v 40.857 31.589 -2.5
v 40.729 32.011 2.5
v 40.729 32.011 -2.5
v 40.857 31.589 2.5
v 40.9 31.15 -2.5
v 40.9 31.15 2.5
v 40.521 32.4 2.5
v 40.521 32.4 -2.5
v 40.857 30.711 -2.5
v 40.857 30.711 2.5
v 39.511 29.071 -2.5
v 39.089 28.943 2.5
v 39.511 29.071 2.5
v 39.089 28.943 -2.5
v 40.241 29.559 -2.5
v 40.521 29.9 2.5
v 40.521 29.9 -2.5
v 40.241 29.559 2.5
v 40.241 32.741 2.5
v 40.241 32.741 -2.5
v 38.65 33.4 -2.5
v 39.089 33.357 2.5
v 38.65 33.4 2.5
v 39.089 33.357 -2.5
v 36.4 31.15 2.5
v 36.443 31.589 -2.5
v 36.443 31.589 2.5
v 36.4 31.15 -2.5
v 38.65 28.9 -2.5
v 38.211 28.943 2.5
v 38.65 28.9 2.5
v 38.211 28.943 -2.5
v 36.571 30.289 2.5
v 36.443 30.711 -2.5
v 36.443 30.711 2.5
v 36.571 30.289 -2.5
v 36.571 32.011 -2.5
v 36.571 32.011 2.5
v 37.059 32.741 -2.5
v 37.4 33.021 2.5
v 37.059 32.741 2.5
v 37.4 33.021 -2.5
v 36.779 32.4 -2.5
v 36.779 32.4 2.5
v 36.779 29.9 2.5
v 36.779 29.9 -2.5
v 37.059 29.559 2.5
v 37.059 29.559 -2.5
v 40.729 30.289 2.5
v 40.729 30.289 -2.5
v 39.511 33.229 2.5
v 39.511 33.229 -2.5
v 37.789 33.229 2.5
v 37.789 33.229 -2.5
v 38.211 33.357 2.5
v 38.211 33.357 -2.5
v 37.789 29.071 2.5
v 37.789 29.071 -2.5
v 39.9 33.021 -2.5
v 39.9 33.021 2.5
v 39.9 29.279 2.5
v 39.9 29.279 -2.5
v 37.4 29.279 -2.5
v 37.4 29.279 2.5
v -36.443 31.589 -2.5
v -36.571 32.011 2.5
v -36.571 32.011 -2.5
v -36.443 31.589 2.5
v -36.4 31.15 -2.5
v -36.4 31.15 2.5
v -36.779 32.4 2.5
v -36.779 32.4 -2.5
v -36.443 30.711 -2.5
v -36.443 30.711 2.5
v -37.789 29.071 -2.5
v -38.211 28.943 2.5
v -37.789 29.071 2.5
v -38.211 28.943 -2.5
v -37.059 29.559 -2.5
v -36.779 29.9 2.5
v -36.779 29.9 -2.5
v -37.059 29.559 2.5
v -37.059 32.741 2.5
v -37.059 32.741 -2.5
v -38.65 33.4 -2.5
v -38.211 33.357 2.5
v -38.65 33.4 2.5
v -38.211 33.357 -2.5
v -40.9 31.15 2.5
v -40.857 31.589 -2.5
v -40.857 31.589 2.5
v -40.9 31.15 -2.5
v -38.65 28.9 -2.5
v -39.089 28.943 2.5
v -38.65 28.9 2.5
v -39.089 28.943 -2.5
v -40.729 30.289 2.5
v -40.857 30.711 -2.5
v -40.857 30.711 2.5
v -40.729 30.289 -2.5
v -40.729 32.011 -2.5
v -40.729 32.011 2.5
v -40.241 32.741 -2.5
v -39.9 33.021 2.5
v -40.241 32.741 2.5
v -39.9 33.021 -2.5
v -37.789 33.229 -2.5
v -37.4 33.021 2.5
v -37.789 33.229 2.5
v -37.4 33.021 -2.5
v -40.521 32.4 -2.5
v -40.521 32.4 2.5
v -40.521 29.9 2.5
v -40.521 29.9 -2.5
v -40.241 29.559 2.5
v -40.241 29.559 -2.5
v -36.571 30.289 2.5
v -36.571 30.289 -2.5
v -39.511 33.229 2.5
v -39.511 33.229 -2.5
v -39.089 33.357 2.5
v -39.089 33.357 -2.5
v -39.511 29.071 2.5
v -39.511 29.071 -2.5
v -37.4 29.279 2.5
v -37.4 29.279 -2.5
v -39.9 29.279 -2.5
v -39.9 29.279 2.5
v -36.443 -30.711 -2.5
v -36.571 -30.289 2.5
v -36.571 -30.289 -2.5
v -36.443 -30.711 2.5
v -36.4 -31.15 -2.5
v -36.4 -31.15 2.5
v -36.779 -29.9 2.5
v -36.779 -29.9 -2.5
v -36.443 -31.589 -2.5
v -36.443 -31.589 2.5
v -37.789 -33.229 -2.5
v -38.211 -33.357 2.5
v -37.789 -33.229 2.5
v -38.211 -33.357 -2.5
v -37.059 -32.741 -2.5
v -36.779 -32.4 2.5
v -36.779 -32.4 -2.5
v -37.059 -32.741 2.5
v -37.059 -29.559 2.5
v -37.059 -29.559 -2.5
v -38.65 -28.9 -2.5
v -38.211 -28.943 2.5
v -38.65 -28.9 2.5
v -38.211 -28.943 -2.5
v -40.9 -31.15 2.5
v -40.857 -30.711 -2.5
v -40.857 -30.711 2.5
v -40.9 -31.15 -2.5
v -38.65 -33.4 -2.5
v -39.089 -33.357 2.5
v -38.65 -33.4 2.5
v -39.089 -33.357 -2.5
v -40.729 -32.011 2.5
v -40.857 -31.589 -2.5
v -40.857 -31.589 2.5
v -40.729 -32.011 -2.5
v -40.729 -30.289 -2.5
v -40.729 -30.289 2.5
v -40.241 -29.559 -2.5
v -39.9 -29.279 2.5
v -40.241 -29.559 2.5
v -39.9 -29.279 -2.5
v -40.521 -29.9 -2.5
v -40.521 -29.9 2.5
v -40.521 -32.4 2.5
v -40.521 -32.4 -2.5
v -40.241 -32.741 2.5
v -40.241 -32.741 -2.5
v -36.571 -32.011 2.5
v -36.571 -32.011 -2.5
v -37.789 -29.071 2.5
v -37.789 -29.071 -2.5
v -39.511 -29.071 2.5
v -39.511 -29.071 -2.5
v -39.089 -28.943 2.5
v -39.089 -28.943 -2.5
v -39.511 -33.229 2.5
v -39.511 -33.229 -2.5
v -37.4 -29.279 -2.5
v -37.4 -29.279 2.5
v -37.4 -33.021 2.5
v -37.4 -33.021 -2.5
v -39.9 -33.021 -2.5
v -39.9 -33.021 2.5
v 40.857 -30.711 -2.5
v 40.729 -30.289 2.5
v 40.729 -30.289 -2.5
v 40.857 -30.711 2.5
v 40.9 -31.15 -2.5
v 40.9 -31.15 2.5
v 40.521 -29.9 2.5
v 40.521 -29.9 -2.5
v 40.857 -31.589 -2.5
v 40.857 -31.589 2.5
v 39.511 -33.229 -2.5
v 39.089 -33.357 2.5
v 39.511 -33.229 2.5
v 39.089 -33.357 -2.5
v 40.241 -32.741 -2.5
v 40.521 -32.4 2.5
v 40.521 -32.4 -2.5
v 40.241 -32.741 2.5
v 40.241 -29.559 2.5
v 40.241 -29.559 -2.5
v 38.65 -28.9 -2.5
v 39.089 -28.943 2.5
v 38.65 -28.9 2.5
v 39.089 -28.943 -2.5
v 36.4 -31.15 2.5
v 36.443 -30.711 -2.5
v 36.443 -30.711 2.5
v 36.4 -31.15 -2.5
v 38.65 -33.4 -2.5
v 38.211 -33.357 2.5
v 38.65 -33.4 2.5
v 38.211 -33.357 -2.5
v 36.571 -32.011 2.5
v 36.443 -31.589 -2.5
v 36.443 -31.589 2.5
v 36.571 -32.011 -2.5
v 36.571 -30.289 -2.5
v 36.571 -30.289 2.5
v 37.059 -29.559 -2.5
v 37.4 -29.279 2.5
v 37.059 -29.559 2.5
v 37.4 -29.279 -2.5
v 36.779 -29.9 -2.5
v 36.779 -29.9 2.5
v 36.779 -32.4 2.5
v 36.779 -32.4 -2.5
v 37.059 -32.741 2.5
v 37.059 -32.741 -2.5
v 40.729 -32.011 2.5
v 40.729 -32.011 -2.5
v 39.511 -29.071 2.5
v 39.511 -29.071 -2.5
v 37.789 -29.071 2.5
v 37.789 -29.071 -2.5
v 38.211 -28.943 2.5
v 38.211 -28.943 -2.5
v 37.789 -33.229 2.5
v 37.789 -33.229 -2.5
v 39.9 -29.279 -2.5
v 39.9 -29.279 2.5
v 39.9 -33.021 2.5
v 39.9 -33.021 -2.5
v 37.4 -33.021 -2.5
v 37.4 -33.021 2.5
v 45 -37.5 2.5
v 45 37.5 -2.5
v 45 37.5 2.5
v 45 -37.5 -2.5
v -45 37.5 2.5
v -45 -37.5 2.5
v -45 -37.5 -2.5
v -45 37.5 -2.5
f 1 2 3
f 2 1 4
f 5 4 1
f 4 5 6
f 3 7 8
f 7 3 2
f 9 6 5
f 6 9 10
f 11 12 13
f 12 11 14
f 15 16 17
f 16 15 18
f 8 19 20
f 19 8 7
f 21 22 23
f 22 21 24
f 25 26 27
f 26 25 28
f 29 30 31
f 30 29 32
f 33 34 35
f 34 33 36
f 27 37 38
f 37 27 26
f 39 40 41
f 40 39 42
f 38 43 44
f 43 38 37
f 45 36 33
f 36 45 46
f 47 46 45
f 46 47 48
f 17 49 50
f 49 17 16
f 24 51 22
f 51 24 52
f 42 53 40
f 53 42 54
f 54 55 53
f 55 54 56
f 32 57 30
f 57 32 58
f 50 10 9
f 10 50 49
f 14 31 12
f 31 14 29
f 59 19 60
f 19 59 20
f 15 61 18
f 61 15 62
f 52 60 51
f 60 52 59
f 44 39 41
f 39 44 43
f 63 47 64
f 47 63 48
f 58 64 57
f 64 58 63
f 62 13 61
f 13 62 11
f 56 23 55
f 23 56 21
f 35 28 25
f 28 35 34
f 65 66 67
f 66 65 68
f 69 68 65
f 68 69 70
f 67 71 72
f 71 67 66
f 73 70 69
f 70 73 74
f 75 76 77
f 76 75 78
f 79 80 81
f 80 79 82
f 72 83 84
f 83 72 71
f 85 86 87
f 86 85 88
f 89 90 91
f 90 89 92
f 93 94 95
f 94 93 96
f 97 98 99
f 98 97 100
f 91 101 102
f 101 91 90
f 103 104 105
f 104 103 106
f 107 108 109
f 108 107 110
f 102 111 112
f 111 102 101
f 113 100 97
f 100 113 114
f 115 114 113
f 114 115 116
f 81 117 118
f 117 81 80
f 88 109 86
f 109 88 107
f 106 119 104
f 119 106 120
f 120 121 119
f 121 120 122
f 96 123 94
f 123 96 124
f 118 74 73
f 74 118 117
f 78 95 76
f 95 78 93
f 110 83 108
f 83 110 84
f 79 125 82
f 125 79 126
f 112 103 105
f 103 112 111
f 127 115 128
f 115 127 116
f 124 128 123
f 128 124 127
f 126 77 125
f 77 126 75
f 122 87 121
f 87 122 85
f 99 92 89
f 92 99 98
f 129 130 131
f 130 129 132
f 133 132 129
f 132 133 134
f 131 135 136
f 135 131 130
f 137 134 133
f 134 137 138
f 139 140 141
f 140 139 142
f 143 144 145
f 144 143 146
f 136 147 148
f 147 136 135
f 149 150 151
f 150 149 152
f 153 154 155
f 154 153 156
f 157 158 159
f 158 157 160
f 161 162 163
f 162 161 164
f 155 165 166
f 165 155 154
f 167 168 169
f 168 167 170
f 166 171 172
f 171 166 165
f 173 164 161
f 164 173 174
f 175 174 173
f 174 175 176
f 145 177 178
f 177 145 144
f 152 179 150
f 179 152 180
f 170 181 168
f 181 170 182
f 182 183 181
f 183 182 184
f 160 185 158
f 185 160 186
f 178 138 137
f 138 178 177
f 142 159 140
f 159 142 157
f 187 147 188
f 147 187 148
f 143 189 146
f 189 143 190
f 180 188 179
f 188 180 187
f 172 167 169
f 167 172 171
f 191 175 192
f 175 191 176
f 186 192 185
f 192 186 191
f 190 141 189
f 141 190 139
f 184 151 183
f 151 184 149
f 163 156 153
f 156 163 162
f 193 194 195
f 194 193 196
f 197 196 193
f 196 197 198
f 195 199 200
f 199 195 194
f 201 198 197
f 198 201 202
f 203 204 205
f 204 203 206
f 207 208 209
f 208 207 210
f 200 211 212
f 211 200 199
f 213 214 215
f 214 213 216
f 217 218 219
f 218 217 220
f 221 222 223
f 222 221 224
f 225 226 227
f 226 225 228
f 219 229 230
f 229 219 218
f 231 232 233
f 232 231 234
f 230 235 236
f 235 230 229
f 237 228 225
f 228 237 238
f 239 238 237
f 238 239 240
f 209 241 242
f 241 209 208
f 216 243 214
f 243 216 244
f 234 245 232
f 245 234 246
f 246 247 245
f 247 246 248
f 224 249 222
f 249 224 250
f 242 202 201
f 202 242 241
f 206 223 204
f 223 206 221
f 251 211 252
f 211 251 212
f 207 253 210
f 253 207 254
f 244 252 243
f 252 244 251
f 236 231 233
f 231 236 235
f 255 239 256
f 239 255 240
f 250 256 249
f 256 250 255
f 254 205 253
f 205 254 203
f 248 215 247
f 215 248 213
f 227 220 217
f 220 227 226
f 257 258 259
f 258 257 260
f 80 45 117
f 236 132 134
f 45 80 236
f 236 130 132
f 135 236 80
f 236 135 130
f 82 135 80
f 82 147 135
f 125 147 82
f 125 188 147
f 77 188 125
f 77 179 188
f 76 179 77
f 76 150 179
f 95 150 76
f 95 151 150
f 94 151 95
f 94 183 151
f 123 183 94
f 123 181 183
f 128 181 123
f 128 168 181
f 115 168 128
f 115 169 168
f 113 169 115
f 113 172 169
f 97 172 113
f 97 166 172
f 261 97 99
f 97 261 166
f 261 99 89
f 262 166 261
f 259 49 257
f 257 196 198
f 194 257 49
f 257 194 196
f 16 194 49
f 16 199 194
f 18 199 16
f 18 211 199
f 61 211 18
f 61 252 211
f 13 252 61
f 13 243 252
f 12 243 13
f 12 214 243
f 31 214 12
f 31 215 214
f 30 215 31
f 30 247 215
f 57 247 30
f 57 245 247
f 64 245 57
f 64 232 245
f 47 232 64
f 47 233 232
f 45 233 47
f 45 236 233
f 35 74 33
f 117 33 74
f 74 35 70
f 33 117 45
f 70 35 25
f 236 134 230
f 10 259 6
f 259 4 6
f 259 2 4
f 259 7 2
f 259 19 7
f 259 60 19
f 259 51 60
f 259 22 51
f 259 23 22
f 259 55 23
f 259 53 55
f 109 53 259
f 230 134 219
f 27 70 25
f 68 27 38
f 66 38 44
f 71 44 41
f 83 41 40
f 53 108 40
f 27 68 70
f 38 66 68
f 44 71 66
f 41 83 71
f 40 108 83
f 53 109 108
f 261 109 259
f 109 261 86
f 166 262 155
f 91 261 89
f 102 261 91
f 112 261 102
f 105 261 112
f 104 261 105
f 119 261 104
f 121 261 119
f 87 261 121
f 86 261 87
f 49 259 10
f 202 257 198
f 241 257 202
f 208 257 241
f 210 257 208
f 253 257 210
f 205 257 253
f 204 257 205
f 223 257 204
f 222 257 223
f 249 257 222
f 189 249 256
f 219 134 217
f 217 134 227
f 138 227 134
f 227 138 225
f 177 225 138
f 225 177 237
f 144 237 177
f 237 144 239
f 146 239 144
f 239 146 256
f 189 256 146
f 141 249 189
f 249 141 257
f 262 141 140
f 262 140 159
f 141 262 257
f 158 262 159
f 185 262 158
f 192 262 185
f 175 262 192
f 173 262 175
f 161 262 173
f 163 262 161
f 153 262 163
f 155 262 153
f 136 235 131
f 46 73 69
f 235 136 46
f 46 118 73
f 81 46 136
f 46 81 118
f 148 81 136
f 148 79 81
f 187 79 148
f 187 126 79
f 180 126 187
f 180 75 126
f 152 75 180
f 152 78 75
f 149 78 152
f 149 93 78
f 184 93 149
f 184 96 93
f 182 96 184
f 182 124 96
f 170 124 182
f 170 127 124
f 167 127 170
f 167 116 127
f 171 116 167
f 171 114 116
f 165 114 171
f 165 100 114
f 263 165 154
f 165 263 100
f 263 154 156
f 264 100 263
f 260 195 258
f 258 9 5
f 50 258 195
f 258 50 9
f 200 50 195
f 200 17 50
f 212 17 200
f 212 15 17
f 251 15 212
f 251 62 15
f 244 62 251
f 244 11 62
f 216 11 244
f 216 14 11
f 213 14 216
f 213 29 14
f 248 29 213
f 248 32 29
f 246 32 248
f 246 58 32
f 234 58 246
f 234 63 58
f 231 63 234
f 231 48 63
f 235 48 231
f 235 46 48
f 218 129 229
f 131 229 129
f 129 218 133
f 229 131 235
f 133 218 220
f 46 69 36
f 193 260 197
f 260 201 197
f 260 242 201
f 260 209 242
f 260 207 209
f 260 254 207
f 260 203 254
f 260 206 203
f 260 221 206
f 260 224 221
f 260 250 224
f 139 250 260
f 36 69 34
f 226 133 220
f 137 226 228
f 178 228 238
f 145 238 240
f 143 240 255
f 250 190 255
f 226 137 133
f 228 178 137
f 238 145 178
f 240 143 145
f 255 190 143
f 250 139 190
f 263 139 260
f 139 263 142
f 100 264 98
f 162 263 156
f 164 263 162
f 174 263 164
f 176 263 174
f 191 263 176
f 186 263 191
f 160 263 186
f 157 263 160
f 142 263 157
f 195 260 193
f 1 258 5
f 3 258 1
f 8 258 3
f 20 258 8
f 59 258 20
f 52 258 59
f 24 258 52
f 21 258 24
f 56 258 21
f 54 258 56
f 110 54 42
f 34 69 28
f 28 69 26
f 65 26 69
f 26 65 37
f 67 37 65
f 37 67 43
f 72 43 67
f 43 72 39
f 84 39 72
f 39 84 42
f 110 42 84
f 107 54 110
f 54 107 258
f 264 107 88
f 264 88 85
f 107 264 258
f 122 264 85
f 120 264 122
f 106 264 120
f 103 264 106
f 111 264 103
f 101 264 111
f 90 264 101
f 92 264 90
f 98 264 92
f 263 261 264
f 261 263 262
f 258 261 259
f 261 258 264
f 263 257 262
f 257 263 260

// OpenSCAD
$fn = 32;

// ----------------------------------------------------------------------
// Corner plate 90 x 75 x 5
// 4 holes, centres taken from the edge offset
// ----------------------------------------------------------------------

// --- parameters (mm) ---
plate = [90, 75, 5];  // overall size (x, y, z)
holes = 4;            // number of holes the drawing asks for
hole_d = 4.5;         // hole diameter
edge = 6.35;          // hole centre offset from the plate edge

// --- derived feature positions (mm) ---
corner_x = plate[0] / 2 - edge;  // = 38.65   corner hole X
corner_y = plate[1] / 2 - edge;  // = 31.15   corner hole Y
feature_centers = [
  [corner_x, corner_y],
  [-corner_x, corner_y],
  [-corner_x, -corner_y],
  [corner_x, -corner_y]
];   // hole centres the loop below drills

// plate outline, every hole drilled through with the same cutters
difference() {
  cube(plate, center = true);
  for (centre = feature_centers)
    translate([centre[0], centre[1], 0])
      cylinder(d = hole_d, h = plate[2] + 2, center = true);
}
